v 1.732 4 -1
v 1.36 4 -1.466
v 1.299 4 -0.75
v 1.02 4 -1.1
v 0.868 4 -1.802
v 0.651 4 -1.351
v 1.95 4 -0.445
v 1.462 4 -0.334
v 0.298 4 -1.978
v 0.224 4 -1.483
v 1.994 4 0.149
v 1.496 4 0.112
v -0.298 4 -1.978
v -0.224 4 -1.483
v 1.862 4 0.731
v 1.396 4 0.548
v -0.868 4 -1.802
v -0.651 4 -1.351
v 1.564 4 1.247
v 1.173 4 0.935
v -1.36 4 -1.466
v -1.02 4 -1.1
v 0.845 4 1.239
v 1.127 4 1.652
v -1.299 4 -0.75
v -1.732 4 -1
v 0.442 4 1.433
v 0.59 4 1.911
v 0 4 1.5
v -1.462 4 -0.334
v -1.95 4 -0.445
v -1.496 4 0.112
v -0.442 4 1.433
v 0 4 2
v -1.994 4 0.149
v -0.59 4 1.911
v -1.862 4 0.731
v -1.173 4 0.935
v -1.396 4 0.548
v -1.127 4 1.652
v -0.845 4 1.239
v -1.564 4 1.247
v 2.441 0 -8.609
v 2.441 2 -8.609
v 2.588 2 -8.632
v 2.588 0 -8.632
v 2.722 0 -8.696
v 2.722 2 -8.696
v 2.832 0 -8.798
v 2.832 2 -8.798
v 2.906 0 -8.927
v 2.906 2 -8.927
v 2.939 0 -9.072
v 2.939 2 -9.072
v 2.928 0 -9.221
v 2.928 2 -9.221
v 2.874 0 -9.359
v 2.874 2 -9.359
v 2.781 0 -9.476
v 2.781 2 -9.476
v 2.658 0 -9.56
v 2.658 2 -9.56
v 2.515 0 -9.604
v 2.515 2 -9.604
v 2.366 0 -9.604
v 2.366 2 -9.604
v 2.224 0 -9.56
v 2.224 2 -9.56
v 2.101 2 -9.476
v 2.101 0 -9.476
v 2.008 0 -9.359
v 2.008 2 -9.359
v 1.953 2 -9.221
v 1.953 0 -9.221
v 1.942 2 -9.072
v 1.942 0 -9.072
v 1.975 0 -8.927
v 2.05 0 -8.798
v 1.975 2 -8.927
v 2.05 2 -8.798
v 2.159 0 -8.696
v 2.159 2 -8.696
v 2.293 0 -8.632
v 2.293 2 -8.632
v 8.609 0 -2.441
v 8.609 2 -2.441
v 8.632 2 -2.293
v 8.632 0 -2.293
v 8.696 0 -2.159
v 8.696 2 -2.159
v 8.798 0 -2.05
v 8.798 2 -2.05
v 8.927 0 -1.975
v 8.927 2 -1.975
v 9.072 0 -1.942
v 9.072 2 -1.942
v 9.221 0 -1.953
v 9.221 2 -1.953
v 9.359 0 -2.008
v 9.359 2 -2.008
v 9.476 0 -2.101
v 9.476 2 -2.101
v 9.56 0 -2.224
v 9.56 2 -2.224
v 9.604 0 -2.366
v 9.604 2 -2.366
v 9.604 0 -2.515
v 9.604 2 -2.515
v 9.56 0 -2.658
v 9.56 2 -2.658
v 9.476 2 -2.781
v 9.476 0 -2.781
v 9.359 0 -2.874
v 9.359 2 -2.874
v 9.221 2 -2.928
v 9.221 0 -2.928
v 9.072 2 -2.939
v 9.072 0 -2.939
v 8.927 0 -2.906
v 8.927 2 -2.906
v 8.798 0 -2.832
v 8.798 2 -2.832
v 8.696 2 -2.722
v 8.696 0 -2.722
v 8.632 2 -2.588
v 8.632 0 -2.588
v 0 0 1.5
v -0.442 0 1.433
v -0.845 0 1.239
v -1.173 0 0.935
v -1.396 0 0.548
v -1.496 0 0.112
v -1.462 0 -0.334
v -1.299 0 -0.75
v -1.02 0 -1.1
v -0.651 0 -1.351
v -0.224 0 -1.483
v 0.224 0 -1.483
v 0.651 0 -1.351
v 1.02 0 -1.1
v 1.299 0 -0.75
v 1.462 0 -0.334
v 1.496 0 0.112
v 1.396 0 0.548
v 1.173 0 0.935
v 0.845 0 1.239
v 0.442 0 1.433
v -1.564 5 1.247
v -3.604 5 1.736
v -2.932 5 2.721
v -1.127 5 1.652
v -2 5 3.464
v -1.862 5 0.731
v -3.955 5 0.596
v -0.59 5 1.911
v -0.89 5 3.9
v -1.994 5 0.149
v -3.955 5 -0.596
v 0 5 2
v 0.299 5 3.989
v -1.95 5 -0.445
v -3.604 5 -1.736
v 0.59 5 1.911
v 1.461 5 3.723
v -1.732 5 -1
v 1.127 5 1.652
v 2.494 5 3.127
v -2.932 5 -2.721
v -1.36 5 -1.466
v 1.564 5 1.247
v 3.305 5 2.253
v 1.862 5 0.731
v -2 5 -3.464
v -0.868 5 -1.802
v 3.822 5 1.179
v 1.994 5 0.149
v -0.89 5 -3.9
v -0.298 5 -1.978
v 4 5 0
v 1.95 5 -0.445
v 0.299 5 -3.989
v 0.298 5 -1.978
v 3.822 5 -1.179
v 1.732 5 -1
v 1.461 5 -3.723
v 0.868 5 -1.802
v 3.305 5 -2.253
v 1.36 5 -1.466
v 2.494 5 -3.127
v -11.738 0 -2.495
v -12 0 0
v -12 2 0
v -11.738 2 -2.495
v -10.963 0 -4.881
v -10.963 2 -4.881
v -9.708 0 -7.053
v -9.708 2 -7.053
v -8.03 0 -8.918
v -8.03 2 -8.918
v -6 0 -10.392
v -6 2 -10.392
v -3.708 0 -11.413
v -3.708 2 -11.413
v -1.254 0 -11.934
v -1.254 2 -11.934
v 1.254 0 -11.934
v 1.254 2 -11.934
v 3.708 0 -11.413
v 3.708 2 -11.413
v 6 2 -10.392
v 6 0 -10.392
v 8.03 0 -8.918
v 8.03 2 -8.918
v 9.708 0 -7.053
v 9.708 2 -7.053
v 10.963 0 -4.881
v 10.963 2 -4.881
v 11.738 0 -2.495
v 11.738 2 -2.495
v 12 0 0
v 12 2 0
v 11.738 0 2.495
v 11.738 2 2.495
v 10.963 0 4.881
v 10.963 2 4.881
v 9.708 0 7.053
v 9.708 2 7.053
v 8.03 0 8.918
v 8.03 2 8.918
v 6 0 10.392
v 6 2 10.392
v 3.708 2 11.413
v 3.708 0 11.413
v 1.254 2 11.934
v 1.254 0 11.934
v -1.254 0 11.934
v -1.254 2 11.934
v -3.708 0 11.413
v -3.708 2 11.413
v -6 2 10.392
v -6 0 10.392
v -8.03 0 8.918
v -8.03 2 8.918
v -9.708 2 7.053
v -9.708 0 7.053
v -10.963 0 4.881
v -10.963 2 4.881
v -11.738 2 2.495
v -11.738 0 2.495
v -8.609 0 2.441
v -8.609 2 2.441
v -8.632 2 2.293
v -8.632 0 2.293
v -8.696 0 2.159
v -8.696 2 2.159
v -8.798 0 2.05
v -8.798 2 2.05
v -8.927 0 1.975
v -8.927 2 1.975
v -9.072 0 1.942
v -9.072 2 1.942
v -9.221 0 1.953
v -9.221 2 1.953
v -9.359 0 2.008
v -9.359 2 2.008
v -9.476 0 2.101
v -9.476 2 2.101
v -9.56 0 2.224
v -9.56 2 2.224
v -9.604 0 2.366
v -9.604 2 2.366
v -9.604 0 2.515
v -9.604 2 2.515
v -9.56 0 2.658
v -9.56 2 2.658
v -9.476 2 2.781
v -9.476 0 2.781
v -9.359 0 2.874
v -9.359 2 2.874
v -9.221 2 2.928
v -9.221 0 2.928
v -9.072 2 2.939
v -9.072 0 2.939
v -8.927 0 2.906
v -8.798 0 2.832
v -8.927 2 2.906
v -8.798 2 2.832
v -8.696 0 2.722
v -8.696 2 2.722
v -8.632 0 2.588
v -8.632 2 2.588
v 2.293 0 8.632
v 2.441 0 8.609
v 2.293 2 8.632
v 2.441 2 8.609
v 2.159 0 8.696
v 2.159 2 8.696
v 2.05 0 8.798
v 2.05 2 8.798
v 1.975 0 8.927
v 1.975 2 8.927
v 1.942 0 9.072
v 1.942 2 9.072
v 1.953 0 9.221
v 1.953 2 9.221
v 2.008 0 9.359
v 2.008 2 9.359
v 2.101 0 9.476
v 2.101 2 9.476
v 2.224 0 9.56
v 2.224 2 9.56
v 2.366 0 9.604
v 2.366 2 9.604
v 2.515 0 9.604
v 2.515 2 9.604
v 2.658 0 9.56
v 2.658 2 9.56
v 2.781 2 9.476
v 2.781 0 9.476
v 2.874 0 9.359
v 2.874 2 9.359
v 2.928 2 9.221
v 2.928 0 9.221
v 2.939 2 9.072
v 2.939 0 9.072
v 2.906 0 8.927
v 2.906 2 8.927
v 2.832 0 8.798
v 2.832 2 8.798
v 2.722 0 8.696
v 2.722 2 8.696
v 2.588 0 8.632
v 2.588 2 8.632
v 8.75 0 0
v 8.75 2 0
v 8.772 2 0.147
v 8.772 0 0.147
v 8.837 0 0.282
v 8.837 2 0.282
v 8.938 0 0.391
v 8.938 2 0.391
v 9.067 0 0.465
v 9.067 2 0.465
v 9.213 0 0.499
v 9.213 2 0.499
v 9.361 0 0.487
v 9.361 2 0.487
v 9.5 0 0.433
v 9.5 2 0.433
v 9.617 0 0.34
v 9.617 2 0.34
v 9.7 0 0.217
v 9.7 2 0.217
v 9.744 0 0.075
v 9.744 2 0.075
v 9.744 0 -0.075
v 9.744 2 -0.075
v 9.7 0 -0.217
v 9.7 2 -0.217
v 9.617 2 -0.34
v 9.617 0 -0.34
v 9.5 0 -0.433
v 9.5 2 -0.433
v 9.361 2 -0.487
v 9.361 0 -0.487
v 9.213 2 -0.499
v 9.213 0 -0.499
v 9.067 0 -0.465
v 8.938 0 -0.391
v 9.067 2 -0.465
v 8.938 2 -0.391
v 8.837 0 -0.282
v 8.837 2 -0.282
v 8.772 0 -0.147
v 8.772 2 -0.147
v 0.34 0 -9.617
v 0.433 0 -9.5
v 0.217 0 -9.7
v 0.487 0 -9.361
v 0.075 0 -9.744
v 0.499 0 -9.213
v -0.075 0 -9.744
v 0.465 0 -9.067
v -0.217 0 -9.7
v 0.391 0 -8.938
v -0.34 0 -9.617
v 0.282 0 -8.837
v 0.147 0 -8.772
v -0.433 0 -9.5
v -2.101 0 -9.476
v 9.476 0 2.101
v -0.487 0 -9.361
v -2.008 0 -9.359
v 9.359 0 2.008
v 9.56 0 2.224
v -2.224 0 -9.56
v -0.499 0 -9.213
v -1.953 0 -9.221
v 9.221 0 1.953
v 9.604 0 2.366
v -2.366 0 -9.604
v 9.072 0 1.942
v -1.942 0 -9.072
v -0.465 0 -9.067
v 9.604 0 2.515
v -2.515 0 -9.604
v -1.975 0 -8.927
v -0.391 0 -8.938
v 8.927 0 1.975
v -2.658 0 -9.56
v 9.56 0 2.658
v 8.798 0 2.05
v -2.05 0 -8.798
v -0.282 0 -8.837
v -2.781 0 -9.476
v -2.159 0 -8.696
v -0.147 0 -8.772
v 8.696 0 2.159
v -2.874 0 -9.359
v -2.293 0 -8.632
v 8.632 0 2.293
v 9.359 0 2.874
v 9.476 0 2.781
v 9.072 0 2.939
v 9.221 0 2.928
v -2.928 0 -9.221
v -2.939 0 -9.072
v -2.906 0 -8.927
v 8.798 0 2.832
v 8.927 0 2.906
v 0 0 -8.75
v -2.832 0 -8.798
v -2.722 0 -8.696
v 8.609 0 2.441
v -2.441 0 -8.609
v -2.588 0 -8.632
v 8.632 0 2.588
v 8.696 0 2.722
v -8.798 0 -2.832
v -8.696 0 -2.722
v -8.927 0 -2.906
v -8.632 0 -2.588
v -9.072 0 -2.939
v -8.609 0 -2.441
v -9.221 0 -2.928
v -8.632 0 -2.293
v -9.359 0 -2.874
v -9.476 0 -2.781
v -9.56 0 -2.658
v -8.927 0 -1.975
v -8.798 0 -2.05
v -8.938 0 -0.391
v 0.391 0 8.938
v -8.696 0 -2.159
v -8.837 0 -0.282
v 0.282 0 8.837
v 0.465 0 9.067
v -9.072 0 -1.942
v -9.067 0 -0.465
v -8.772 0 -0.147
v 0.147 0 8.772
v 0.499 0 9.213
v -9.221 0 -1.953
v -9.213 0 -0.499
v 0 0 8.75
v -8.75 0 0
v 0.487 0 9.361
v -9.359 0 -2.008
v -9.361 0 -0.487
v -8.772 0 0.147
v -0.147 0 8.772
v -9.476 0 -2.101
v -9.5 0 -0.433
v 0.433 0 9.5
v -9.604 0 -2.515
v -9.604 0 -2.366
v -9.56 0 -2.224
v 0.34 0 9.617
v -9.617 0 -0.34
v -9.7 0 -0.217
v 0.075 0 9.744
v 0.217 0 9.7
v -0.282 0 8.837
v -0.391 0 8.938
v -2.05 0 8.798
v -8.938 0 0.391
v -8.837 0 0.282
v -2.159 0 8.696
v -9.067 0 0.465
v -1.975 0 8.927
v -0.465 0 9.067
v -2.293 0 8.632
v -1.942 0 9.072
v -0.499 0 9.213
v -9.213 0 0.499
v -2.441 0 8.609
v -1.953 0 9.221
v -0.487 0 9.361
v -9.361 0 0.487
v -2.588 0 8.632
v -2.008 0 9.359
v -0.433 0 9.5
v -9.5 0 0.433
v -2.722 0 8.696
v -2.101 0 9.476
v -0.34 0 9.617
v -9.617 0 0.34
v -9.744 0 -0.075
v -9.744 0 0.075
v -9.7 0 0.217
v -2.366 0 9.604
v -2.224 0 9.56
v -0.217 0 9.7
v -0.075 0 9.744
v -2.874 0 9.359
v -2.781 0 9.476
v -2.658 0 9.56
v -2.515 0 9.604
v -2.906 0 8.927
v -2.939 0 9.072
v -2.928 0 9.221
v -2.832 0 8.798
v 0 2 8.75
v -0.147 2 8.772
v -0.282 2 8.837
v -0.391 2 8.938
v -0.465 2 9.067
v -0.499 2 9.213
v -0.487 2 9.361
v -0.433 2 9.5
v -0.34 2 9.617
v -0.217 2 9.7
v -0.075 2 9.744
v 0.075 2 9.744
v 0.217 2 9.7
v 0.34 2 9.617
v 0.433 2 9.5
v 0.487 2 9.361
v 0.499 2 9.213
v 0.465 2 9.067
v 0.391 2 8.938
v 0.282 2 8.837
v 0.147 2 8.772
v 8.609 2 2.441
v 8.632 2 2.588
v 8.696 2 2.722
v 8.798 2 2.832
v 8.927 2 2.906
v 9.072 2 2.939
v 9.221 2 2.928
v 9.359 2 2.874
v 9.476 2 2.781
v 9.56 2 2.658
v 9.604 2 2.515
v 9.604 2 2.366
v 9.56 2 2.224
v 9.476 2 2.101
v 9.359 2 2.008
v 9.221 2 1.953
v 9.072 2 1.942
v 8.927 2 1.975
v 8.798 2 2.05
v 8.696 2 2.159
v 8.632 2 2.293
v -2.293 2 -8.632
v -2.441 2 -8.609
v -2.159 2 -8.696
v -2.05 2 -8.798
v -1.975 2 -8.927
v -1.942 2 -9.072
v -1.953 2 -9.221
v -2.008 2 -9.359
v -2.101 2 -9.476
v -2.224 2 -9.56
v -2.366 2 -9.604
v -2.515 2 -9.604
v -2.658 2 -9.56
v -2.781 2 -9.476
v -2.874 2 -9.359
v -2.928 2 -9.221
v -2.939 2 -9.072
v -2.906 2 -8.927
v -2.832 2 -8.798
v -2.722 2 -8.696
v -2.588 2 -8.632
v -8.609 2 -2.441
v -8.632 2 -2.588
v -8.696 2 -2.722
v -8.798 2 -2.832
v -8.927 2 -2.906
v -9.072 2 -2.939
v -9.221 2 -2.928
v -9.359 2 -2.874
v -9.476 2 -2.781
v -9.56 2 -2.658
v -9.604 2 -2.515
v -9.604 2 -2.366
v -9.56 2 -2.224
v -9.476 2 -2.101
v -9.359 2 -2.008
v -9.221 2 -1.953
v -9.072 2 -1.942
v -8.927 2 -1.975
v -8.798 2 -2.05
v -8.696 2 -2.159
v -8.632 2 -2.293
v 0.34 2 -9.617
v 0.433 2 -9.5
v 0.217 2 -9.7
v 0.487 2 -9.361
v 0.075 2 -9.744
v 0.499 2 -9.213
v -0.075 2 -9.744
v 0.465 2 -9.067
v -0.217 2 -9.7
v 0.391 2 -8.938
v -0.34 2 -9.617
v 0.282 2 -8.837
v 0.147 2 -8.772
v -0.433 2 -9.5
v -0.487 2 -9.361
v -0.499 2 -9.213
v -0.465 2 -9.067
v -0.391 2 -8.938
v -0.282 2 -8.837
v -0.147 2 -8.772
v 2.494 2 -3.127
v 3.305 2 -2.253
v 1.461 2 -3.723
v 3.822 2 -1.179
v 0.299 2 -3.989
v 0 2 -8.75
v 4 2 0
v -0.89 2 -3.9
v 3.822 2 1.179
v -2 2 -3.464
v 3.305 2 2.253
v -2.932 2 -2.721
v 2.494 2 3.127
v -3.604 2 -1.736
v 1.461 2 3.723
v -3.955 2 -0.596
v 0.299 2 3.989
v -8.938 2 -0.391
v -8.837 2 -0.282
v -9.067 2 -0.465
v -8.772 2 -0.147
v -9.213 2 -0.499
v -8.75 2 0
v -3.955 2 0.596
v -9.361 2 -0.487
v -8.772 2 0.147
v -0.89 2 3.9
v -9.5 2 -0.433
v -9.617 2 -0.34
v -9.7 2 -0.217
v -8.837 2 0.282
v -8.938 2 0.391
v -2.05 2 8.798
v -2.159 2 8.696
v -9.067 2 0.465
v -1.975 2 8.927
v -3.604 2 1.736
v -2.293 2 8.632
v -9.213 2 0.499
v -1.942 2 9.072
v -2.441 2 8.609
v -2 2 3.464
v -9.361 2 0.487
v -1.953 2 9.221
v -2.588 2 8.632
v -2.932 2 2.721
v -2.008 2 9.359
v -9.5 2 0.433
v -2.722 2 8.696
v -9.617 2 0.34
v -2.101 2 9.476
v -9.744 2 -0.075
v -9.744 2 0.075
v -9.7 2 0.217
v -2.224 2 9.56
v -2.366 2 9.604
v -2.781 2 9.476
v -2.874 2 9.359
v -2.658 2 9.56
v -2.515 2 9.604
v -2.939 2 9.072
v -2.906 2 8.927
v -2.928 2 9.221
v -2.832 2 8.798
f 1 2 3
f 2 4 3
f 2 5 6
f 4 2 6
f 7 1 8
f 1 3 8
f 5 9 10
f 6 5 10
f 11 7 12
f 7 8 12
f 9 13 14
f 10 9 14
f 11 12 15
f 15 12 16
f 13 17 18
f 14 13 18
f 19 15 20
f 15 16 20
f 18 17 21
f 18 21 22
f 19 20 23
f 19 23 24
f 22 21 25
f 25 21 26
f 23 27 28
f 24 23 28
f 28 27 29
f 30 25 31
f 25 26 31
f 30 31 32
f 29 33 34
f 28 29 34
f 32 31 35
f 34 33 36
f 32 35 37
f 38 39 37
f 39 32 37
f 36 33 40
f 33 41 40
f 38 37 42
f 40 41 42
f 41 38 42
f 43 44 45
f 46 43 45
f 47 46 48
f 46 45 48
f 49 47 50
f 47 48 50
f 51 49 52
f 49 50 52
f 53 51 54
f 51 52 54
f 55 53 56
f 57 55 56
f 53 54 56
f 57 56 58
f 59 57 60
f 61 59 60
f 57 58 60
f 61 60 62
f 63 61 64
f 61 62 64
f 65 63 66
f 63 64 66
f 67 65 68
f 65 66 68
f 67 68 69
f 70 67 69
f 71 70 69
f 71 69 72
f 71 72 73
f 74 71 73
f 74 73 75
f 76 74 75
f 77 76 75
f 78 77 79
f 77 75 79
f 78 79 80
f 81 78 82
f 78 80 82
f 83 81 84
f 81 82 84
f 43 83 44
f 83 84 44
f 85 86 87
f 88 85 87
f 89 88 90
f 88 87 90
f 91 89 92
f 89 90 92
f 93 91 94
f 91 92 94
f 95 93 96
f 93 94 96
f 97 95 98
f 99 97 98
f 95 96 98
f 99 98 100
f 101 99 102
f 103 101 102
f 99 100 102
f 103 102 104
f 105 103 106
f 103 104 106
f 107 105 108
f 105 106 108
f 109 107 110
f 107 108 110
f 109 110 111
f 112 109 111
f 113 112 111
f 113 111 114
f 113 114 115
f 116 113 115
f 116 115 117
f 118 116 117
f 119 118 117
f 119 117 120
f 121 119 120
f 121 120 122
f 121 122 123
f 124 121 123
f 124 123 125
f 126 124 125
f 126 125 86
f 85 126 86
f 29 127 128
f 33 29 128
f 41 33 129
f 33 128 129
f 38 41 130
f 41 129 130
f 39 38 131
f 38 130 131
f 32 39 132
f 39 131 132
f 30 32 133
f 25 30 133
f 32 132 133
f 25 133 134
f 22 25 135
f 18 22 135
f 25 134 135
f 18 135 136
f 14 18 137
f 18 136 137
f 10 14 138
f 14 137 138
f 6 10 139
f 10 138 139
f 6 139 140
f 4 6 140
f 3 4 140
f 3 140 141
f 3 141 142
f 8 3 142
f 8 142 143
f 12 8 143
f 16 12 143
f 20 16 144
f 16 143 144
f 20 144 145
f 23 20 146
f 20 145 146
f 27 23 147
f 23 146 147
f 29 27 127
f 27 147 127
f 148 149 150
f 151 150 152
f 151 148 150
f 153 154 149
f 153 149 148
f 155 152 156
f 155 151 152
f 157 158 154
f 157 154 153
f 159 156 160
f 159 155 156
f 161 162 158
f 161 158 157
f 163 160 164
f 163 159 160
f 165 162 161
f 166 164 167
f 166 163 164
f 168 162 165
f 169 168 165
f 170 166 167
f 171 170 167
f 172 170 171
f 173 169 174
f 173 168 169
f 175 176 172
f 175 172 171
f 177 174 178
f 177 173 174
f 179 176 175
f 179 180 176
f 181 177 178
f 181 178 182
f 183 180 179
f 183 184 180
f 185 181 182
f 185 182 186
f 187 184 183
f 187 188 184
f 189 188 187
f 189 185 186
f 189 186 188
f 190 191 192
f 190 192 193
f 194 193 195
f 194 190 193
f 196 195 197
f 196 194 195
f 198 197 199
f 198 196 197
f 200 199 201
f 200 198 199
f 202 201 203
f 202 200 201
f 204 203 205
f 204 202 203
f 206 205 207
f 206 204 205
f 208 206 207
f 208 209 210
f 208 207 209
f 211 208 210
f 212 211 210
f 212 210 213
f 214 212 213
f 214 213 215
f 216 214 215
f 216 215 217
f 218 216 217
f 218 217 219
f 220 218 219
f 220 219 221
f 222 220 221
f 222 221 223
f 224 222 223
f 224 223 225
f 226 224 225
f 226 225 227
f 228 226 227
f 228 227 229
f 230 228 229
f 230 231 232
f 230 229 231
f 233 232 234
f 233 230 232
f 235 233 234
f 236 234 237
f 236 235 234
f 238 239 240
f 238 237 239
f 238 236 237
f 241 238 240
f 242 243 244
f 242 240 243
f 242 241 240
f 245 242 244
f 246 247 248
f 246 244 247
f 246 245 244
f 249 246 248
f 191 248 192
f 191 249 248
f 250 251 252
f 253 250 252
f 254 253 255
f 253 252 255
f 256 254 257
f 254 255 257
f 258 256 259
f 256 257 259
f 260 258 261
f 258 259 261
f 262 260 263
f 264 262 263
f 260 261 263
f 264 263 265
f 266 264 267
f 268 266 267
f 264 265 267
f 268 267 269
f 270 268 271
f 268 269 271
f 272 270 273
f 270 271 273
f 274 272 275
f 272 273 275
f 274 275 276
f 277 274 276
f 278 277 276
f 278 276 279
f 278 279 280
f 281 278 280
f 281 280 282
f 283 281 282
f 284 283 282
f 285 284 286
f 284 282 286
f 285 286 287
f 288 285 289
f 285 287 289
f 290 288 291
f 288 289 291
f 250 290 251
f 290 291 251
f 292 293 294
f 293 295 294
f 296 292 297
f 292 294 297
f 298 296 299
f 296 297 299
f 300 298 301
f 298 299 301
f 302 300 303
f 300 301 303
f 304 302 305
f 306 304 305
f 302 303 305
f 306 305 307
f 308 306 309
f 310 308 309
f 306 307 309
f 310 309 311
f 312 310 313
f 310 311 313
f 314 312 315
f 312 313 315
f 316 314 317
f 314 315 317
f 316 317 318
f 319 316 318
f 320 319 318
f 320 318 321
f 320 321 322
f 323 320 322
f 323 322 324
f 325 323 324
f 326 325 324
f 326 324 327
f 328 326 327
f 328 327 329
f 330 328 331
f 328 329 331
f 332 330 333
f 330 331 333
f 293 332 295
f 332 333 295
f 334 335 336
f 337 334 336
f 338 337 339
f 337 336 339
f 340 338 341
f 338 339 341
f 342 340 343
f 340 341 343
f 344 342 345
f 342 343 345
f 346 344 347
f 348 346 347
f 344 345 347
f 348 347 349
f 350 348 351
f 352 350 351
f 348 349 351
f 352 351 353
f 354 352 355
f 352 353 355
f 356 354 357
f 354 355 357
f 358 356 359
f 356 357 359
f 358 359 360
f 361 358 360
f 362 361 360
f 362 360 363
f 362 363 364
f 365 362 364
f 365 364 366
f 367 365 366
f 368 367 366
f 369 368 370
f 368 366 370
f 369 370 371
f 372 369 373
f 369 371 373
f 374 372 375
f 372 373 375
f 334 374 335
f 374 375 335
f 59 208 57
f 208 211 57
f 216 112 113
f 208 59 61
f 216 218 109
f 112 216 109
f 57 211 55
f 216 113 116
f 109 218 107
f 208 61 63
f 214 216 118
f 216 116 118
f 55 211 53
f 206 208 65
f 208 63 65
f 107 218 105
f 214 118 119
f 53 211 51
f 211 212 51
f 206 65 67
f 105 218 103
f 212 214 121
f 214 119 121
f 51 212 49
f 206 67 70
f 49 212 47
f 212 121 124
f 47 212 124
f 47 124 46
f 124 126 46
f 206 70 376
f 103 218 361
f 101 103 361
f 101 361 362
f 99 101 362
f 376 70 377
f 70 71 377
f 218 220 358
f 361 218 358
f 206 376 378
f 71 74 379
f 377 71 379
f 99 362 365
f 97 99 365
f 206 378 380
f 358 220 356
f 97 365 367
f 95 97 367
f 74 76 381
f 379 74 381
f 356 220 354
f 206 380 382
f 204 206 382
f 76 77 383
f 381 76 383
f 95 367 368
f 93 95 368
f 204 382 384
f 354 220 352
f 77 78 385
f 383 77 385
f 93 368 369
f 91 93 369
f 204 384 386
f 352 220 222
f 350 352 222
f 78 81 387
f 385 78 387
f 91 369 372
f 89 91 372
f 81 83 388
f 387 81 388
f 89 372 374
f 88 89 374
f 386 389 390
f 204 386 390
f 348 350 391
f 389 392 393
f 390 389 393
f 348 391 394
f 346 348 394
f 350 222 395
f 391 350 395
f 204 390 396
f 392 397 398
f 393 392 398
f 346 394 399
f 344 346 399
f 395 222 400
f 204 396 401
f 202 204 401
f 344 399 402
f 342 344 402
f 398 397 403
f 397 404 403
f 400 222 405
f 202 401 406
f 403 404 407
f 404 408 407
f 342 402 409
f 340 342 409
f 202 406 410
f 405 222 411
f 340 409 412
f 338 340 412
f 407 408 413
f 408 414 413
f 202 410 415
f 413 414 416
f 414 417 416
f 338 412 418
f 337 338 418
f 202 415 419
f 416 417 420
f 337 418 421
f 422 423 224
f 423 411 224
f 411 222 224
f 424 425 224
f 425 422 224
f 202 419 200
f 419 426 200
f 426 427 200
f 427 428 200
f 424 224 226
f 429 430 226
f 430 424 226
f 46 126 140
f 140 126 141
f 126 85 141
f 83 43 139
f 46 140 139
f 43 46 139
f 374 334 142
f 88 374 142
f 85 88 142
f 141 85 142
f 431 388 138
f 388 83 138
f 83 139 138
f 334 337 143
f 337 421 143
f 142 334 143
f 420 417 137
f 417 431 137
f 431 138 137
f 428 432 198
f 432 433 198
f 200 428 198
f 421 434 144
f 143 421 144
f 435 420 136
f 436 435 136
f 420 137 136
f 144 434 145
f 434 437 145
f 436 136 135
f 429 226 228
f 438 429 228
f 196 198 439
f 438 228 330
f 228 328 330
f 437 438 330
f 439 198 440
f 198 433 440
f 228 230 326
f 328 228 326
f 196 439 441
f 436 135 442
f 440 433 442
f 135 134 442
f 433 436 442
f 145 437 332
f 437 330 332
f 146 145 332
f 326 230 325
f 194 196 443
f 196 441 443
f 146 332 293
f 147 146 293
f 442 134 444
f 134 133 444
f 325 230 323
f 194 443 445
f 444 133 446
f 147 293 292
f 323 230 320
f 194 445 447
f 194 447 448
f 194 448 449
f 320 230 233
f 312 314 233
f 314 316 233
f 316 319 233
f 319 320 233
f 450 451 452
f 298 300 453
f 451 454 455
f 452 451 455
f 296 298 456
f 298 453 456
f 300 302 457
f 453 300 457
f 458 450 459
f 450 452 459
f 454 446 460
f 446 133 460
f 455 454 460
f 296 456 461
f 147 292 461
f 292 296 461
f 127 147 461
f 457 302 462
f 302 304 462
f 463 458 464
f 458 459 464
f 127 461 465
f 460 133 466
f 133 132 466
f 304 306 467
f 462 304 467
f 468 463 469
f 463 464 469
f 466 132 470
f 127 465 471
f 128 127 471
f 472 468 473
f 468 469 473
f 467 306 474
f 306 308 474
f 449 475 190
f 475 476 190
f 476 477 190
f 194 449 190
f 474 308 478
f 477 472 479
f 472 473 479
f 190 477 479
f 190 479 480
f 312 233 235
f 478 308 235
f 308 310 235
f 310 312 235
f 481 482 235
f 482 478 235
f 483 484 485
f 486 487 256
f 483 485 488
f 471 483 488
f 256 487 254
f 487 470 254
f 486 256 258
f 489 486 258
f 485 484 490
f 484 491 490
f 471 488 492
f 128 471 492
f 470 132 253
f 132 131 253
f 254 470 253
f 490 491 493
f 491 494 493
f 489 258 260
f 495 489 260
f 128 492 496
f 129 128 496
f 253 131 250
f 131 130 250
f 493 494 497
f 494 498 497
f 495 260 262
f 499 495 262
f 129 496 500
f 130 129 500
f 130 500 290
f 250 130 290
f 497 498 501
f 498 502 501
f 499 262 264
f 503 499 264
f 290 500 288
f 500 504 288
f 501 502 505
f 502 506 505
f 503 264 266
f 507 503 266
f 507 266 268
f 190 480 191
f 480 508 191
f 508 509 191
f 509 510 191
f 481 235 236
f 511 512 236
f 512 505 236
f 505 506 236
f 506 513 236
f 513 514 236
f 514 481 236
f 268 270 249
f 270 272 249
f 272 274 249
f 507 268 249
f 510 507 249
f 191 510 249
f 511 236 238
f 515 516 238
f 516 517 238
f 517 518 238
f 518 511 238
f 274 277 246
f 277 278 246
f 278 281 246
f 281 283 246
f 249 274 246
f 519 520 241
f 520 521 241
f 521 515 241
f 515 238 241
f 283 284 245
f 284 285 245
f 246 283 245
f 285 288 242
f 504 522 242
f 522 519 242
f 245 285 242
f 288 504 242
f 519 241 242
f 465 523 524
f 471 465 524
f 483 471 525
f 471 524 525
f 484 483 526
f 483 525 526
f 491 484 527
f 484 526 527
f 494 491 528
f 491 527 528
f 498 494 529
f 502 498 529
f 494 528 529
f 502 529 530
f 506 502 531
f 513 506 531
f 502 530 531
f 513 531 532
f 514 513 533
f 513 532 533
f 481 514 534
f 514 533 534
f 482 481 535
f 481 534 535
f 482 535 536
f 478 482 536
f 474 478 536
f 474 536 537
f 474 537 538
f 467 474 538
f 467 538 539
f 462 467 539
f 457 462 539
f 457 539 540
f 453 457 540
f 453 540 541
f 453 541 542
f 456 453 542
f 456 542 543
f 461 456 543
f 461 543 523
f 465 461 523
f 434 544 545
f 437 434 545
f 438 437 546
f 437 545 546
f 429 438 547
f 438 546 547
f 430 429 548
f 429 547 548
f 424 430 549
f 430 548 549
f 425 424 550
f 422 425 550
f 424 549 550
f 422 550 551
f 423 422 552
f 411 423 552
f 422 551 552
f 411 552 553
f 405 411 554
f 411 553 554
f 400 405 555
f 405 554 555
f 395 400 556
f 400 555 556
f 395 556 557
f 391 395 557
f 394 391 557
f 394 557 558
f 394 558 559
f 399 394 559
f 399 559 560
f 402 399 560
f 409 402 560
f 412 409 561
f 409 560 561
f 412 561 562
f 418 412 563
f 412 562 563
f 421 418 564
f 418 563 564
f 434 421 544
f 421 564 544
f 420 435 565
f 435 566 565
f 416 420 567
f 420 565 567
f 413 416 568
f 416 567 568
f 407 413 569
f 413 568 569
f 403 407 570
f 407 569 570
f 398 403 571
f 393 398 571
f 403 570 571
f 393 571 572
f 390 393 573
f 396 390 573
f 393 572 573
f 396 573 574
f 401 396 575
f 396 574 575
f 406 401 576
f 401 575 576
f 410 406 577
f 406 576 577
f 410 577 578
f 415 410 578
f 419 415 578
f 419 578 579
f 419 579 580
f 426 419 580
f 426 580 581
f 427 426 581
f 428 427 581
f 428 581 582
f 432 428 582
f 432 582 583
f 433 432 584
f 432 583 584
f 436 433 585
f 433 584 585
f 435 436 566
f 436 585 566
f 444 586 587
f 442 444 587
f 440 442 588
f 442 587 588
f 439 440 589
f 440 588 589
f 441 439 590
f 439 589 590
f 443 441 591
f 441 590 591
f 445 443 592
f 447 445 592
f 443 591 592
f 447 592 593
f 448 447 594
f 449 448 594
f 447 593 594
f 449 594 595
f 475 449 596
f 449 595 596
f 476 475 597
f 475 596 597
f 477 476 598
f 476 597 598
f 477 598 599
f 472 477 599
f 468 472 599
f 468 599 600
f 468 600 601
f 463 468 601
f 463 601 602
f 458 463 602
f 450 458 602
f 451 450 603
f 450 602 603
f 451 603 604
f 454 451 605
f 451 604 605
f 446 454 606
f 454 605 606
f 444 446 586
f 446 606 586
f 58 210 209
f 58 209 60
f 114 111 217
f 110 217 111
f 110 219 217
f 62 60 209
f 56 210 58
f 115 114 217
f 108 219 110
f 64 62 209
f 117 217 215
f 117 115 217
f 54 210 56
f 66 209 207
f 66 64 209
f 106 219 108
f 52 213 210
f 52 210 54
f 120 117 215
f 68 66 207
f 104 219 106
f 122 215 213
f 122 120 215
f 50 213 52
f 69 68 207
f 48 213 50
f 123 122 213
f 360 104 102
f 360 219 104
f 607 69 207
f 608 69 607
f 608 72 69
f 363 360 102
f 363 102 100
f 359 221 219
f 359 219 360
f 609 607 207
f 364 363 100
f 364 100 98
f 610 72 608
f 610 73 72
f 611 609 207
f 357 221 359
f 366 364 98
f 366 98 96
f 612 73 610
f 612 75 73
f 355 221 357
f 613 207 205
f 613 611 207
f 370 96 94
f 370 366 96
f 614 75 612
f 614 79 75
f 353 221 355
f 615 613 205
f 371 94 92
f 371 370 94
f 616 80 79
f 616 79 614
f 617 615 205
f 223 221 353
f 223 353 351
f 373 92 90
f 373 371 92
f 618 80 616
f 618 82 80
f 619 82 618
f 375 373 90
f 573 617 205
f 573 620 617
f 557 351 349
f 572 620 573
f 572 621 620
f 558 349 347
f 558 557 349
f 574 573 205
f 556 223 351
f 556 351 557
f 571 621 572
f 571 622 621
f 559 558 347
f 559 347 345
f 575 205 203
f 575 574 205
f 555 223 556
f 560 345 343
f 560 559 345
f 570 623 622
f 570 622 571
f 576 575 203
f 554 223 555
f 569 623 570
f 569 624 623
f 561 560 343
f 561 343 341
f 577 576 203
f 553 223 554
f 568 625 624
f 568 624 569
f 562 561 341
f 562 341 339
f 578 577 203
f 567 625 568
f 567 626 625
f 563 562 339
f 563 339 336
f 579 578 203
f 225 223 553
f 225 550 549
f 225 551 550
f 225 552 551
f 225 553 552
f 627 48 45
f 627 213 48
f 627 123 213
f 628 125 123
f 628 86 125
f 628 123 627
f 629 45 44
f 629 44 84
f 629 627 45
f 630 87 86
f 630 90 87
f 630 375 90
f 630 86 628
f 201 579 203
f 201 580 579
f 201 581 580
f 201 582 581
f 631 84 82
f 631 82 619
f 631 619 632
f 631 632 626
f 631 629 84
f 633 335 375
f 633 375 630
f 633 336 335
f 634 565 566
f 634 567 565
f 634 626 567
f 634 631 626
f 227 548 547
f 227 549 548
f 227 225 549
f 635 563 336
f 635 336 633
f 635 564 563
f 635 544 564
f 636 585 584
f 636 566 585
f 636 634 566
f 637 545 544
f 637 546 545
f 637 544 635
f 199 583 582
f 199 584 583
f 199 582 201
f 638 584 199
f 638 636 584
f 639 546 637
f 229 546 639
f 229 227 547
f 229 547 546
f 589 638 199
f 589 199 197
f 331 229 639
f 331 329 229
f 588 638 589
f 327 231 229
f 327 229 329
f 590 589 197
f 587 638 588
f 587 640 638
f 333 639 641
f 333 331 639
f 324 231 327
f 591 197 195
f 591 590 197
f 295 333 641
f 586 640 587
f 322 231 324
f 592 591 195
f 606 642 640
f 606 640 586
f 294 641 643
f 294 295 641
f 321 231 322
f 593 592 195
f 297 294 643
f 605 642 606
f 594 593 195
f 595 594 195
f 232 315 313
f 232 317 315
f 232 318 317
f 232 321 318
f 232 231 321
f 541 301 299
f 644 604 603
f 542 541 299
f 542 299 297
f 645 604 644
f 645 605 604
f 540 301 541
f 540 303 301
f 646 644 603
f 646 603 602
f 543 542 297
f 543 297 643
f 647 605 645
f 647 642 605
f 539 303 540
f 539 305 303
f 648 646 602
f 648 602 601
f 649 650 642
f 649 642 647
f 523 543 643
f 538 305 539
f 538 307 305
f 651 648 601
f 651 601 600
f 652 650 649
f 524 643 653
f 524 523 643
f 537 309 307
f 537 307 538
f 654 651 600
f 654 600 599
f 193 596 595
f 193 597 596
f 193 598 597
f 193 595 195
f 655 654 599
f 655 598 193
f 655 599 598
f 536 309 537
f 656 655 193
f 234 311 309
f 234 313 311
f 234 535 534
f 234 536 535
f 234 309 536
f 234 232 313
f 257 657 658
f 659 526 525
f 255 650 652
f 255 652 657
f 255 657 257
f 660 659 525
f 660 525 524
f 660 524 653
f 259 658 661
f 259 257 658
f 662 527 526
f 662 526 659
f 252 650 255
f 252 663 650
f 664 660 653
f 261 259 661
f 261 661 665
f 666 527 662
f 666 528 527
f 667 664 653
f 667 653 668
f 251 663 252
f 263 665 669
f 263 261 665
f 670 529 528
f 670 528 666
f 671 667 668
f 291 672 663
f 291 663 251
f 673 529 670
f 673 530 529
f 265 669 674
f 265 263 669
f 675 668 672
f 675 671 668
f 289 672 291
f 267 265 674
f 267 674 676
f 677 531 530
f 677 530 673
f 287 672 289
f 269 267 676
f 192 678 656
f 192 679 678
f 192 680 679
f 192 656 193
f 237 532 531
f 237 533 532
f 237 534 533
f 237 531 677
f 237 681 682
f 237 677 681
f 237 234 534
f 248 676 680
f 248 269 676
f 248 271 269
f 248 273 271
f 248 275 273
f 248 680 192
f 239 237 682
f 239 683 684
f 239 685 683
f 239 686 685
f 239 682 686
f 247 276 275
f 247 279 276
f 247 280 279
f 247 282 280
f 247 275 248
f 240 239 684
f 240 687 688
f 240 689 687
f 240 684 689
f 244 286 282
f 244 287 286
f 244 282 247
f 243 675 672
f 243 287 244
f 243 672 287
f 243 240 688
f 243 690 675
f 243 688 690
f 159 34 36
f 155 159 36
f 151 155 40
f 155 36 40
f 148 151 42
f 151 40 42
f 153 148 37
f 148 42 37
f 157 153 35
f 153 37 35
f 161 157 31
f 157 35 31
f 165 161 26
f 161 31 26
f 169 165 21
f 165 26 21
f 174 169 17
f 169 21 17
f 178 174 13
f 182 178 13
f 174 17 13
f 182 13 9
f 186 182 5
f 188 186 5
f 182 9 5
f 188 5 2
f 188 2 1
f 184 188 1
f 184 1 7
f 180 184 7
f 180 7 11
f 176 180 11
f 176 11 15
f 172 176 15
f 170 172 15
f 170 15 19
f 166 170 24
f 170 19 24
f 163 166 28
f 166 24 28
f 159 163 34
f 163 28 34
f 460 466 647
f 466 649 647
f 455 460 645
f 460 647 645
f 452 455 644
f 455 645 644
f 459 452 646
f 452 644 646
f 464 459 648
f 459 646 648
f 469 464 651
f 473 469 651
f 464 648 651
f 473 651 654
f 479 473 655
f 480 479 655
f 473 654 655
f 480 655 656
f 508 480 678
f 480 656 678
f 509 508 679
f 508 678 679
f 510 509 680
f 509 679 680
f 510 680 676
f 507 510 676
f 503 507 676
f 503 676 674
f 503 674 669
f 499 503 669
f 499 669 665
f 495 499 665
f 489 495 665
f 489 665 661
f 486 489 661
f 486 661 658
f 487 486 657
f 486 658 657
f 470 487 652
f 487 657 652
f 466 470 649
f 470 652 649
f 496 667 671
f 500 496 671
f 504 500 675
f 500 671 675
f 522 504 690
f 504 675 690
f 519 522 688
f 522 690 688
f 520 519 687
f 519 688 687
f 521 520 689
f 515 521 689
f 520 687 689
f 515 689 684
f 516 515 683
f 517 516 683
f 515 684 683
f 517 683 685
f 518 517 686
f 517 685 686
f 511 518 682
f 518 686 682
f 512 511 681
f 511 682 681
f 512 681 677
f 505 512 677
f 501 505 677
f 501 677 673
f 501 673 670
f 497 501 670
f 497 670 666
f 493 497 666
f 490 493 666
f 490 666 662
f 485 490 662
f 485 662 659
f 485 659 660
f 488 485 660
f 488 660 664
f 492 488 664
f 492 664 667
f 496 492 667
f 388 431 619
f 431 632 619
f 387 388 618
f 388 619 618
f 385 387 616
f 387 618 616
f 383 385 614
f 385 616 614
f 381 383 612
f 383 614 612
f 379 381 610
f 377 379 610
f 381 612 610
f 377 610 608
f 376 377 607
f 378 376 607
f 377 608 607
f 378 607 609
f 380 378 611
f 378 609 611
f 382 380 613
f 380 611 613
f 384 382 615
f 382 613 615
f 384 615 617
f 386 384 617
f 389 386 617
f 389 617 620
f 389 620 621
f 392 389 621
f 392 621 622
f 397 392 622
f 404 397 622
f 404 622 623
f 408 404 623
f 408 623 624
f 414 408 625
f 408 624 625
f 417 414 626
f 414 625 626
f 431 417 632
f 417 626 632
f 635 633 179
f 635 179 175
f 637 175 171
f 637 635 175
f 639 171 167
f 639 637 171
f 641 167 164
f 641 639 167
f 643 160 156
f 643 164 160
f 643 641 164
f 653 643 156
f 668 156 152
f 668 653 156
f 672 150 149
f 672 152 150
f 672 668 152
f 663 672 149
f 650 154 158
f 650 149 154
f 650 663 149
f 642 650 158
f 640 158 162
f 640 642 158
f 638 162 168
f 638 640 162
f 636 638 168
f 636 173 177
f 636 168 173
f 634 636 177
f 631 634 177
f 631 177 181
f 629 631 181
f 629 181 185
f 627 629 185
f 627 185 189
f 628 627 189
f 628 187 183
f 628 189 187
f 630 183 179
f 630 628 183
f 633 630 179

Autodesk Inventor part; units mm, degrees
ref_plane "YZ Plane" through (0, 0, 0) normal (1, 0, 0) x (0, 1, 0)
ref_plane "XZ Plane" through (0, 0, 0) normal (0, 1, 0) x (-1, 0, 0)
ref_plane "XY Plane" through (0, 0, 0) normal (0, 0, 1) x (1, 0, 0)
sketch "Sketch1" plane through (0, 0, 0) normal (0, 1, 0) x (-1, 0, 0)
  circle A0 centre (0, 0) radius 12
  dimension "d0" = 24
extrude "Extrusion1" add sketch "Sketch1" along normal blind 2
sketch "Sketch2" plane through (0, 2, 0) normal (0, 1, 0) x (1, 0, 0)
  circle A0 centre (0, 0) radius 4
  dimension "d3" = 8
extrude "Extrusion2" add sketch "Sketch2" along normal blind 3
sketch "Sketch3" plane through (0, 5, 0) normal (0, 1, 0) x (1, 0, 0)
  point P0 (0, 0)
  point P1 (0, 0)
hole "Hole1" at (0, 5, 0) direction (0, -1, 0) diameter 3 end through all counterbore diameter 4 counterbore depth 1
sketch "Sketch4" plane through (0, 2, 0) normal (0, 1, 0) x (1, 0, 0)
  circle A0 centre (-9.25, 0) radius 0.5
  line L0 (0, 0) -> (-9.25, 0) construction
  line L1 (0, 0) -> (-9.1094, 2.4408) construction
  line L2 (0, 0) -> (-9.1094, -2.4408) construction
  circle A1 centre (-9.1094, 2.4408) radius 0.5
  circle A2 centre (-9.1094, -2.4408) radius 0.5
  circle A3 centre (0, 0) radius 12 projected
  circle A4 centre (12, 0) radius 21.25 construction
  dimension "d13" = 15
  dimension "d14" = 15
  dimension "d15" = 1
  dimension "d16" = 1
  dimension "d17" = 1
  dimension "d25" = 9.25
extrude "Extrusion3" cut sketch "Sketch4" against normal through all contours A0 | A1 | A2
pattern_circular "Circular Pattern1" count 4 over 360 about axis through (0, -29.8074, 0) along (0, 1, 0) of "Extrusion3"
properties part number "Servo wheel"
